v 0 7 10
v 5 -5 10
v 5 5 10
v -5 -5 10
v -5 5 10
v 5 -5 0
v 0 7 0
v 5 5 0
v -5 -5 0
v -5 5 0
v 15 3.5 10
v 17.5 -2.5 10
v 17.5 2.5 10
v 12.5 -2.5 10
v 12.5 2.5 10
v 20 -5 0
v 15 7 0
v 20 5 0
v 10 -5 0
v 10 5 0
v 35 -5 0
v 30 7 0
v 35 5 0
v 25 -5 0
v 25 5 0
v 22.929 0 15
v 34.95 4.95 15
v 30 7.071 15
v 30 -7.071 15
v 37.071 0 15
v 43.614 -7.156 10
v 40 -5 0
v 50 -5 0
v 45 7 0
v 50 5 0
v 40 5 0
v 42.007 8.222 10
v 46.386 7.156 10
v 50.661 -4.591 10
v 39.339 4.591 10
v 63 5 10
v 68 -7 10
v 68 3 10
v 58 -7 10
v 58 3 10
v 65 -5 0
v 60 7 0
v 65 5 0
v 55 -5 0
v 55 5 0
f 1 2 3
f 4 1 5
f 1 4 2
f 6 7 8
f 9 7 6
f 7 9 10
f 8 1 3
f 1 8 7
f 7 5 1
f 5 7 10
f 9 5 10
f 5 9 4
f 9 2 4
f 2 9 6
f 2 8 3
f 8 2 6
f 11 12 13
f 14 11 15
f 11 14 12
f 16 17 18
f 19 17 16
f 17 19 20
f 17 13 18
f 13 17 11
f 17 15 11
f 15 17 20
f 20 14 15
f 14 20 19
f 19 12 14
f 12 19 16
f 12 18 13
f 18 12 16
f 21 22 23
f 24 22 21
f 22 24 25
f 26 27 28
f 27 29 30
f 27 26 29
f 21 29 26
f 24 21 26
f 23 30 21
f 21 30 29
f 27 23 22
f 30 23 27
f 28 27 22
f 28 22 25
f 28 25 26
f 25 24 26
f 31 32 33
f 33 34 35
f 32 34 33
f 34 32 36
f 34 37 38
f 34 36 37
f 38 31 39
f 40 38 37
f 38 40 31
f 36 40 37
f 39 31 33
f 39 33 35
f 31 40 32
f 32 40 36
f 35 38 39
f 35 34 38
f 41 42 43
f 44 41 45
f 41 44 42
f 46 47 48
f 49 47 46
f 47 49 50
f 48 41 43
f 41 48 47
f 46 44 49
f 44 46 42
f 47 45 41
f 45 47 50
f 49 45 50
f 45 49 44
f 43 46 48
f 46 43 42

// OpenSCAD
// An alternative to the standard linear extrusion operation.
//
// A list of 2D coordinates is transformed by the given parametes 
// and moved to the z=h plane. The original and transformed set of 
// points are used to generate a polyhedron.
//
// This program is available under the Creative Commons 
// Attribution-ShareAlike License; additional terms may apply. 
// 
// References:
// https://en.wikipedia.org/wiki/Transformation_matrix#Affine_transformations
// https://en.wikibooks.org/wiki/OpenSCAD_User_Manual/Primitive_Solids#polyhedron
//

// Examples
// Test points are a set is a house shape cenetered on [0,0]
points = [[-5,-5],[5,-5],[5,5],[0,7],[-5,5]];

// height 10, no other transforms
alt_extrude(points, 10);

// height 10, top surface scaled to half size
translate([15,0,0]) alt_extrude(points, 10, 0, [.5,.5]);

// height 15, rotated 45 deg counter clockwise
translate([30,0,0]) alt_extrude(points, 15, -45, [1, 1]);

// height 10, rotated 20 deg and scaled 75% in X, 125% in Y
translate([45,0,0]) alt_extrude(points, 10, 20, [.75,1.25]);

// height 10, skewed left x=3 and down 2
translate([60,0,0]) alt_extrude(points, 10, 0, [1,1], [3,-2]);
// Examples
//

// Dot product of two vectors
function dot(a, b) = a[0]*b[0]+a[1]*b[1]+a[2]*b[2];


// Form a polygon from the points p. The bottom surfaces is
// and n-gon defined by p while the top surface is generated
// from these by applying transforms given in the parameters
// 
//  p - The set of points forming the base of the polyhedron
//  h - The height of the polyhedron
//  ang-Rotation of the top surface around [0,0]
//  s - A vector length 2 defining the scale factors for x and Y
//  t - A vector defining the translation distance
//
module alt_extrude(p, h=1, ang=0, s=[1,1], t=[0,0]) {

    n = len(p);

    // Generate the transform matrix for top surface. Could be
    // 2x2, but the last column could be used to define a skew
    // Translation. In that case the y-coord for p0 expansion
    // Must be 1 and h+1 used for p0. F
    M =[[s[0]*cos(ang), -s[1]*sin(ang), t[0]],
        [s[0]*sin(ang),  s[1]*cos(ang), t[1]],
        [            0,              0, 1]];

    // Extend coords for bottom to 3D, using z=1 (see Affine
    // Transforms reference above)
    p0 = [ for(i=[0:n-1]) [p[i][0], p[i][1], 1] ];

    // Apply transform matrix to x and y values of p0. Z value is
    // overwritten since it would be ignored for this 2D transform
    // and it is convenient to do it here.
    p1 = [for(i=[0:n-1]) [dot(p0[i],M[0]), dot(p0[i],M[1]), h+1] ];

    // Each faces is defined by a list of vertcies taken from
    // p0 and p1. The top and bottoms are all the p0 and p1
    // taken in clockwise order when looking at the final polyhedron
    // from outside. The others are two points from p0 and the 
    // corresponding 2 from p1.
    bottom = [[for(i=[0:n-1]) i]];
    top   = [[for(i=[2*n-1:-1:n]) i%(2*n)]];
    sides = [ for (i=[0:n-1]) [(0+i)%n+n,(1+i)%n+n,(1+i)%n,(0+i)%n]];
    all_faces = concat(bottom, top, sides);

    // Generate the polyhedron and translate down 1 unit to compensate
    // for offset used to expand 2D points into 3D
    translate([0,0,-1]) polyhedron(concat(p0, p1), all_faces);
}


// TODO: Apply scale and rotate operations to points when generating
// pointsH. Could be done with 2x2 matrix multiplies then expand to 3D.
// Could H translation be performed at the same time? Possibly if
// expanded as with multmatrix (with a translate Z).

// Bottom Face
//points0 = [[0,0,0],[10,0,0],[10,10,0],[5,13,0],[0,10,0]];

// Top Face
//points6 = [[0,1,6],[10,1,6],[9,9,6],[5,13,6],[1,9,6]];

//N=len(points0);  // len of points and pointsH must be the same
//bottom = [[for(i=[0:N-1]) i]];
//top   = [[for(i=[2*N-1:-1:N]) i%(2*N)]];
//sides = [ for (i=[0:N-1]) [(0+i)%N+N,(1+i)%N+N,(1+i)%N,(0+i)%N]];
//all_faces = concat(bottom, top, sides);

//echo(all_faces);
//polyhedron(concat(points0, points6), all_faces);

// hadcoded values taken from example given here:
//https://en.wikibooks.org/wiki/OpenSCAD_User_Manual/Primitive_Solids#polyhedron
//face0 = [[0,0,0],[10,0,0],[10,10,0],[0,10,0]];
//face6 = [[0,1,6],[10,1,6],[9,9,6],[1,9,6]];
/*
CubeFaces = [
  [0,1,2,3],  // bottom
  [7,6,5,4],  // top

  [4,5,1,0],  // front
  [5,6,2,1],  // right
  [6,7,3,2],  // back
  [7,4,0,3]]; // left
*/
